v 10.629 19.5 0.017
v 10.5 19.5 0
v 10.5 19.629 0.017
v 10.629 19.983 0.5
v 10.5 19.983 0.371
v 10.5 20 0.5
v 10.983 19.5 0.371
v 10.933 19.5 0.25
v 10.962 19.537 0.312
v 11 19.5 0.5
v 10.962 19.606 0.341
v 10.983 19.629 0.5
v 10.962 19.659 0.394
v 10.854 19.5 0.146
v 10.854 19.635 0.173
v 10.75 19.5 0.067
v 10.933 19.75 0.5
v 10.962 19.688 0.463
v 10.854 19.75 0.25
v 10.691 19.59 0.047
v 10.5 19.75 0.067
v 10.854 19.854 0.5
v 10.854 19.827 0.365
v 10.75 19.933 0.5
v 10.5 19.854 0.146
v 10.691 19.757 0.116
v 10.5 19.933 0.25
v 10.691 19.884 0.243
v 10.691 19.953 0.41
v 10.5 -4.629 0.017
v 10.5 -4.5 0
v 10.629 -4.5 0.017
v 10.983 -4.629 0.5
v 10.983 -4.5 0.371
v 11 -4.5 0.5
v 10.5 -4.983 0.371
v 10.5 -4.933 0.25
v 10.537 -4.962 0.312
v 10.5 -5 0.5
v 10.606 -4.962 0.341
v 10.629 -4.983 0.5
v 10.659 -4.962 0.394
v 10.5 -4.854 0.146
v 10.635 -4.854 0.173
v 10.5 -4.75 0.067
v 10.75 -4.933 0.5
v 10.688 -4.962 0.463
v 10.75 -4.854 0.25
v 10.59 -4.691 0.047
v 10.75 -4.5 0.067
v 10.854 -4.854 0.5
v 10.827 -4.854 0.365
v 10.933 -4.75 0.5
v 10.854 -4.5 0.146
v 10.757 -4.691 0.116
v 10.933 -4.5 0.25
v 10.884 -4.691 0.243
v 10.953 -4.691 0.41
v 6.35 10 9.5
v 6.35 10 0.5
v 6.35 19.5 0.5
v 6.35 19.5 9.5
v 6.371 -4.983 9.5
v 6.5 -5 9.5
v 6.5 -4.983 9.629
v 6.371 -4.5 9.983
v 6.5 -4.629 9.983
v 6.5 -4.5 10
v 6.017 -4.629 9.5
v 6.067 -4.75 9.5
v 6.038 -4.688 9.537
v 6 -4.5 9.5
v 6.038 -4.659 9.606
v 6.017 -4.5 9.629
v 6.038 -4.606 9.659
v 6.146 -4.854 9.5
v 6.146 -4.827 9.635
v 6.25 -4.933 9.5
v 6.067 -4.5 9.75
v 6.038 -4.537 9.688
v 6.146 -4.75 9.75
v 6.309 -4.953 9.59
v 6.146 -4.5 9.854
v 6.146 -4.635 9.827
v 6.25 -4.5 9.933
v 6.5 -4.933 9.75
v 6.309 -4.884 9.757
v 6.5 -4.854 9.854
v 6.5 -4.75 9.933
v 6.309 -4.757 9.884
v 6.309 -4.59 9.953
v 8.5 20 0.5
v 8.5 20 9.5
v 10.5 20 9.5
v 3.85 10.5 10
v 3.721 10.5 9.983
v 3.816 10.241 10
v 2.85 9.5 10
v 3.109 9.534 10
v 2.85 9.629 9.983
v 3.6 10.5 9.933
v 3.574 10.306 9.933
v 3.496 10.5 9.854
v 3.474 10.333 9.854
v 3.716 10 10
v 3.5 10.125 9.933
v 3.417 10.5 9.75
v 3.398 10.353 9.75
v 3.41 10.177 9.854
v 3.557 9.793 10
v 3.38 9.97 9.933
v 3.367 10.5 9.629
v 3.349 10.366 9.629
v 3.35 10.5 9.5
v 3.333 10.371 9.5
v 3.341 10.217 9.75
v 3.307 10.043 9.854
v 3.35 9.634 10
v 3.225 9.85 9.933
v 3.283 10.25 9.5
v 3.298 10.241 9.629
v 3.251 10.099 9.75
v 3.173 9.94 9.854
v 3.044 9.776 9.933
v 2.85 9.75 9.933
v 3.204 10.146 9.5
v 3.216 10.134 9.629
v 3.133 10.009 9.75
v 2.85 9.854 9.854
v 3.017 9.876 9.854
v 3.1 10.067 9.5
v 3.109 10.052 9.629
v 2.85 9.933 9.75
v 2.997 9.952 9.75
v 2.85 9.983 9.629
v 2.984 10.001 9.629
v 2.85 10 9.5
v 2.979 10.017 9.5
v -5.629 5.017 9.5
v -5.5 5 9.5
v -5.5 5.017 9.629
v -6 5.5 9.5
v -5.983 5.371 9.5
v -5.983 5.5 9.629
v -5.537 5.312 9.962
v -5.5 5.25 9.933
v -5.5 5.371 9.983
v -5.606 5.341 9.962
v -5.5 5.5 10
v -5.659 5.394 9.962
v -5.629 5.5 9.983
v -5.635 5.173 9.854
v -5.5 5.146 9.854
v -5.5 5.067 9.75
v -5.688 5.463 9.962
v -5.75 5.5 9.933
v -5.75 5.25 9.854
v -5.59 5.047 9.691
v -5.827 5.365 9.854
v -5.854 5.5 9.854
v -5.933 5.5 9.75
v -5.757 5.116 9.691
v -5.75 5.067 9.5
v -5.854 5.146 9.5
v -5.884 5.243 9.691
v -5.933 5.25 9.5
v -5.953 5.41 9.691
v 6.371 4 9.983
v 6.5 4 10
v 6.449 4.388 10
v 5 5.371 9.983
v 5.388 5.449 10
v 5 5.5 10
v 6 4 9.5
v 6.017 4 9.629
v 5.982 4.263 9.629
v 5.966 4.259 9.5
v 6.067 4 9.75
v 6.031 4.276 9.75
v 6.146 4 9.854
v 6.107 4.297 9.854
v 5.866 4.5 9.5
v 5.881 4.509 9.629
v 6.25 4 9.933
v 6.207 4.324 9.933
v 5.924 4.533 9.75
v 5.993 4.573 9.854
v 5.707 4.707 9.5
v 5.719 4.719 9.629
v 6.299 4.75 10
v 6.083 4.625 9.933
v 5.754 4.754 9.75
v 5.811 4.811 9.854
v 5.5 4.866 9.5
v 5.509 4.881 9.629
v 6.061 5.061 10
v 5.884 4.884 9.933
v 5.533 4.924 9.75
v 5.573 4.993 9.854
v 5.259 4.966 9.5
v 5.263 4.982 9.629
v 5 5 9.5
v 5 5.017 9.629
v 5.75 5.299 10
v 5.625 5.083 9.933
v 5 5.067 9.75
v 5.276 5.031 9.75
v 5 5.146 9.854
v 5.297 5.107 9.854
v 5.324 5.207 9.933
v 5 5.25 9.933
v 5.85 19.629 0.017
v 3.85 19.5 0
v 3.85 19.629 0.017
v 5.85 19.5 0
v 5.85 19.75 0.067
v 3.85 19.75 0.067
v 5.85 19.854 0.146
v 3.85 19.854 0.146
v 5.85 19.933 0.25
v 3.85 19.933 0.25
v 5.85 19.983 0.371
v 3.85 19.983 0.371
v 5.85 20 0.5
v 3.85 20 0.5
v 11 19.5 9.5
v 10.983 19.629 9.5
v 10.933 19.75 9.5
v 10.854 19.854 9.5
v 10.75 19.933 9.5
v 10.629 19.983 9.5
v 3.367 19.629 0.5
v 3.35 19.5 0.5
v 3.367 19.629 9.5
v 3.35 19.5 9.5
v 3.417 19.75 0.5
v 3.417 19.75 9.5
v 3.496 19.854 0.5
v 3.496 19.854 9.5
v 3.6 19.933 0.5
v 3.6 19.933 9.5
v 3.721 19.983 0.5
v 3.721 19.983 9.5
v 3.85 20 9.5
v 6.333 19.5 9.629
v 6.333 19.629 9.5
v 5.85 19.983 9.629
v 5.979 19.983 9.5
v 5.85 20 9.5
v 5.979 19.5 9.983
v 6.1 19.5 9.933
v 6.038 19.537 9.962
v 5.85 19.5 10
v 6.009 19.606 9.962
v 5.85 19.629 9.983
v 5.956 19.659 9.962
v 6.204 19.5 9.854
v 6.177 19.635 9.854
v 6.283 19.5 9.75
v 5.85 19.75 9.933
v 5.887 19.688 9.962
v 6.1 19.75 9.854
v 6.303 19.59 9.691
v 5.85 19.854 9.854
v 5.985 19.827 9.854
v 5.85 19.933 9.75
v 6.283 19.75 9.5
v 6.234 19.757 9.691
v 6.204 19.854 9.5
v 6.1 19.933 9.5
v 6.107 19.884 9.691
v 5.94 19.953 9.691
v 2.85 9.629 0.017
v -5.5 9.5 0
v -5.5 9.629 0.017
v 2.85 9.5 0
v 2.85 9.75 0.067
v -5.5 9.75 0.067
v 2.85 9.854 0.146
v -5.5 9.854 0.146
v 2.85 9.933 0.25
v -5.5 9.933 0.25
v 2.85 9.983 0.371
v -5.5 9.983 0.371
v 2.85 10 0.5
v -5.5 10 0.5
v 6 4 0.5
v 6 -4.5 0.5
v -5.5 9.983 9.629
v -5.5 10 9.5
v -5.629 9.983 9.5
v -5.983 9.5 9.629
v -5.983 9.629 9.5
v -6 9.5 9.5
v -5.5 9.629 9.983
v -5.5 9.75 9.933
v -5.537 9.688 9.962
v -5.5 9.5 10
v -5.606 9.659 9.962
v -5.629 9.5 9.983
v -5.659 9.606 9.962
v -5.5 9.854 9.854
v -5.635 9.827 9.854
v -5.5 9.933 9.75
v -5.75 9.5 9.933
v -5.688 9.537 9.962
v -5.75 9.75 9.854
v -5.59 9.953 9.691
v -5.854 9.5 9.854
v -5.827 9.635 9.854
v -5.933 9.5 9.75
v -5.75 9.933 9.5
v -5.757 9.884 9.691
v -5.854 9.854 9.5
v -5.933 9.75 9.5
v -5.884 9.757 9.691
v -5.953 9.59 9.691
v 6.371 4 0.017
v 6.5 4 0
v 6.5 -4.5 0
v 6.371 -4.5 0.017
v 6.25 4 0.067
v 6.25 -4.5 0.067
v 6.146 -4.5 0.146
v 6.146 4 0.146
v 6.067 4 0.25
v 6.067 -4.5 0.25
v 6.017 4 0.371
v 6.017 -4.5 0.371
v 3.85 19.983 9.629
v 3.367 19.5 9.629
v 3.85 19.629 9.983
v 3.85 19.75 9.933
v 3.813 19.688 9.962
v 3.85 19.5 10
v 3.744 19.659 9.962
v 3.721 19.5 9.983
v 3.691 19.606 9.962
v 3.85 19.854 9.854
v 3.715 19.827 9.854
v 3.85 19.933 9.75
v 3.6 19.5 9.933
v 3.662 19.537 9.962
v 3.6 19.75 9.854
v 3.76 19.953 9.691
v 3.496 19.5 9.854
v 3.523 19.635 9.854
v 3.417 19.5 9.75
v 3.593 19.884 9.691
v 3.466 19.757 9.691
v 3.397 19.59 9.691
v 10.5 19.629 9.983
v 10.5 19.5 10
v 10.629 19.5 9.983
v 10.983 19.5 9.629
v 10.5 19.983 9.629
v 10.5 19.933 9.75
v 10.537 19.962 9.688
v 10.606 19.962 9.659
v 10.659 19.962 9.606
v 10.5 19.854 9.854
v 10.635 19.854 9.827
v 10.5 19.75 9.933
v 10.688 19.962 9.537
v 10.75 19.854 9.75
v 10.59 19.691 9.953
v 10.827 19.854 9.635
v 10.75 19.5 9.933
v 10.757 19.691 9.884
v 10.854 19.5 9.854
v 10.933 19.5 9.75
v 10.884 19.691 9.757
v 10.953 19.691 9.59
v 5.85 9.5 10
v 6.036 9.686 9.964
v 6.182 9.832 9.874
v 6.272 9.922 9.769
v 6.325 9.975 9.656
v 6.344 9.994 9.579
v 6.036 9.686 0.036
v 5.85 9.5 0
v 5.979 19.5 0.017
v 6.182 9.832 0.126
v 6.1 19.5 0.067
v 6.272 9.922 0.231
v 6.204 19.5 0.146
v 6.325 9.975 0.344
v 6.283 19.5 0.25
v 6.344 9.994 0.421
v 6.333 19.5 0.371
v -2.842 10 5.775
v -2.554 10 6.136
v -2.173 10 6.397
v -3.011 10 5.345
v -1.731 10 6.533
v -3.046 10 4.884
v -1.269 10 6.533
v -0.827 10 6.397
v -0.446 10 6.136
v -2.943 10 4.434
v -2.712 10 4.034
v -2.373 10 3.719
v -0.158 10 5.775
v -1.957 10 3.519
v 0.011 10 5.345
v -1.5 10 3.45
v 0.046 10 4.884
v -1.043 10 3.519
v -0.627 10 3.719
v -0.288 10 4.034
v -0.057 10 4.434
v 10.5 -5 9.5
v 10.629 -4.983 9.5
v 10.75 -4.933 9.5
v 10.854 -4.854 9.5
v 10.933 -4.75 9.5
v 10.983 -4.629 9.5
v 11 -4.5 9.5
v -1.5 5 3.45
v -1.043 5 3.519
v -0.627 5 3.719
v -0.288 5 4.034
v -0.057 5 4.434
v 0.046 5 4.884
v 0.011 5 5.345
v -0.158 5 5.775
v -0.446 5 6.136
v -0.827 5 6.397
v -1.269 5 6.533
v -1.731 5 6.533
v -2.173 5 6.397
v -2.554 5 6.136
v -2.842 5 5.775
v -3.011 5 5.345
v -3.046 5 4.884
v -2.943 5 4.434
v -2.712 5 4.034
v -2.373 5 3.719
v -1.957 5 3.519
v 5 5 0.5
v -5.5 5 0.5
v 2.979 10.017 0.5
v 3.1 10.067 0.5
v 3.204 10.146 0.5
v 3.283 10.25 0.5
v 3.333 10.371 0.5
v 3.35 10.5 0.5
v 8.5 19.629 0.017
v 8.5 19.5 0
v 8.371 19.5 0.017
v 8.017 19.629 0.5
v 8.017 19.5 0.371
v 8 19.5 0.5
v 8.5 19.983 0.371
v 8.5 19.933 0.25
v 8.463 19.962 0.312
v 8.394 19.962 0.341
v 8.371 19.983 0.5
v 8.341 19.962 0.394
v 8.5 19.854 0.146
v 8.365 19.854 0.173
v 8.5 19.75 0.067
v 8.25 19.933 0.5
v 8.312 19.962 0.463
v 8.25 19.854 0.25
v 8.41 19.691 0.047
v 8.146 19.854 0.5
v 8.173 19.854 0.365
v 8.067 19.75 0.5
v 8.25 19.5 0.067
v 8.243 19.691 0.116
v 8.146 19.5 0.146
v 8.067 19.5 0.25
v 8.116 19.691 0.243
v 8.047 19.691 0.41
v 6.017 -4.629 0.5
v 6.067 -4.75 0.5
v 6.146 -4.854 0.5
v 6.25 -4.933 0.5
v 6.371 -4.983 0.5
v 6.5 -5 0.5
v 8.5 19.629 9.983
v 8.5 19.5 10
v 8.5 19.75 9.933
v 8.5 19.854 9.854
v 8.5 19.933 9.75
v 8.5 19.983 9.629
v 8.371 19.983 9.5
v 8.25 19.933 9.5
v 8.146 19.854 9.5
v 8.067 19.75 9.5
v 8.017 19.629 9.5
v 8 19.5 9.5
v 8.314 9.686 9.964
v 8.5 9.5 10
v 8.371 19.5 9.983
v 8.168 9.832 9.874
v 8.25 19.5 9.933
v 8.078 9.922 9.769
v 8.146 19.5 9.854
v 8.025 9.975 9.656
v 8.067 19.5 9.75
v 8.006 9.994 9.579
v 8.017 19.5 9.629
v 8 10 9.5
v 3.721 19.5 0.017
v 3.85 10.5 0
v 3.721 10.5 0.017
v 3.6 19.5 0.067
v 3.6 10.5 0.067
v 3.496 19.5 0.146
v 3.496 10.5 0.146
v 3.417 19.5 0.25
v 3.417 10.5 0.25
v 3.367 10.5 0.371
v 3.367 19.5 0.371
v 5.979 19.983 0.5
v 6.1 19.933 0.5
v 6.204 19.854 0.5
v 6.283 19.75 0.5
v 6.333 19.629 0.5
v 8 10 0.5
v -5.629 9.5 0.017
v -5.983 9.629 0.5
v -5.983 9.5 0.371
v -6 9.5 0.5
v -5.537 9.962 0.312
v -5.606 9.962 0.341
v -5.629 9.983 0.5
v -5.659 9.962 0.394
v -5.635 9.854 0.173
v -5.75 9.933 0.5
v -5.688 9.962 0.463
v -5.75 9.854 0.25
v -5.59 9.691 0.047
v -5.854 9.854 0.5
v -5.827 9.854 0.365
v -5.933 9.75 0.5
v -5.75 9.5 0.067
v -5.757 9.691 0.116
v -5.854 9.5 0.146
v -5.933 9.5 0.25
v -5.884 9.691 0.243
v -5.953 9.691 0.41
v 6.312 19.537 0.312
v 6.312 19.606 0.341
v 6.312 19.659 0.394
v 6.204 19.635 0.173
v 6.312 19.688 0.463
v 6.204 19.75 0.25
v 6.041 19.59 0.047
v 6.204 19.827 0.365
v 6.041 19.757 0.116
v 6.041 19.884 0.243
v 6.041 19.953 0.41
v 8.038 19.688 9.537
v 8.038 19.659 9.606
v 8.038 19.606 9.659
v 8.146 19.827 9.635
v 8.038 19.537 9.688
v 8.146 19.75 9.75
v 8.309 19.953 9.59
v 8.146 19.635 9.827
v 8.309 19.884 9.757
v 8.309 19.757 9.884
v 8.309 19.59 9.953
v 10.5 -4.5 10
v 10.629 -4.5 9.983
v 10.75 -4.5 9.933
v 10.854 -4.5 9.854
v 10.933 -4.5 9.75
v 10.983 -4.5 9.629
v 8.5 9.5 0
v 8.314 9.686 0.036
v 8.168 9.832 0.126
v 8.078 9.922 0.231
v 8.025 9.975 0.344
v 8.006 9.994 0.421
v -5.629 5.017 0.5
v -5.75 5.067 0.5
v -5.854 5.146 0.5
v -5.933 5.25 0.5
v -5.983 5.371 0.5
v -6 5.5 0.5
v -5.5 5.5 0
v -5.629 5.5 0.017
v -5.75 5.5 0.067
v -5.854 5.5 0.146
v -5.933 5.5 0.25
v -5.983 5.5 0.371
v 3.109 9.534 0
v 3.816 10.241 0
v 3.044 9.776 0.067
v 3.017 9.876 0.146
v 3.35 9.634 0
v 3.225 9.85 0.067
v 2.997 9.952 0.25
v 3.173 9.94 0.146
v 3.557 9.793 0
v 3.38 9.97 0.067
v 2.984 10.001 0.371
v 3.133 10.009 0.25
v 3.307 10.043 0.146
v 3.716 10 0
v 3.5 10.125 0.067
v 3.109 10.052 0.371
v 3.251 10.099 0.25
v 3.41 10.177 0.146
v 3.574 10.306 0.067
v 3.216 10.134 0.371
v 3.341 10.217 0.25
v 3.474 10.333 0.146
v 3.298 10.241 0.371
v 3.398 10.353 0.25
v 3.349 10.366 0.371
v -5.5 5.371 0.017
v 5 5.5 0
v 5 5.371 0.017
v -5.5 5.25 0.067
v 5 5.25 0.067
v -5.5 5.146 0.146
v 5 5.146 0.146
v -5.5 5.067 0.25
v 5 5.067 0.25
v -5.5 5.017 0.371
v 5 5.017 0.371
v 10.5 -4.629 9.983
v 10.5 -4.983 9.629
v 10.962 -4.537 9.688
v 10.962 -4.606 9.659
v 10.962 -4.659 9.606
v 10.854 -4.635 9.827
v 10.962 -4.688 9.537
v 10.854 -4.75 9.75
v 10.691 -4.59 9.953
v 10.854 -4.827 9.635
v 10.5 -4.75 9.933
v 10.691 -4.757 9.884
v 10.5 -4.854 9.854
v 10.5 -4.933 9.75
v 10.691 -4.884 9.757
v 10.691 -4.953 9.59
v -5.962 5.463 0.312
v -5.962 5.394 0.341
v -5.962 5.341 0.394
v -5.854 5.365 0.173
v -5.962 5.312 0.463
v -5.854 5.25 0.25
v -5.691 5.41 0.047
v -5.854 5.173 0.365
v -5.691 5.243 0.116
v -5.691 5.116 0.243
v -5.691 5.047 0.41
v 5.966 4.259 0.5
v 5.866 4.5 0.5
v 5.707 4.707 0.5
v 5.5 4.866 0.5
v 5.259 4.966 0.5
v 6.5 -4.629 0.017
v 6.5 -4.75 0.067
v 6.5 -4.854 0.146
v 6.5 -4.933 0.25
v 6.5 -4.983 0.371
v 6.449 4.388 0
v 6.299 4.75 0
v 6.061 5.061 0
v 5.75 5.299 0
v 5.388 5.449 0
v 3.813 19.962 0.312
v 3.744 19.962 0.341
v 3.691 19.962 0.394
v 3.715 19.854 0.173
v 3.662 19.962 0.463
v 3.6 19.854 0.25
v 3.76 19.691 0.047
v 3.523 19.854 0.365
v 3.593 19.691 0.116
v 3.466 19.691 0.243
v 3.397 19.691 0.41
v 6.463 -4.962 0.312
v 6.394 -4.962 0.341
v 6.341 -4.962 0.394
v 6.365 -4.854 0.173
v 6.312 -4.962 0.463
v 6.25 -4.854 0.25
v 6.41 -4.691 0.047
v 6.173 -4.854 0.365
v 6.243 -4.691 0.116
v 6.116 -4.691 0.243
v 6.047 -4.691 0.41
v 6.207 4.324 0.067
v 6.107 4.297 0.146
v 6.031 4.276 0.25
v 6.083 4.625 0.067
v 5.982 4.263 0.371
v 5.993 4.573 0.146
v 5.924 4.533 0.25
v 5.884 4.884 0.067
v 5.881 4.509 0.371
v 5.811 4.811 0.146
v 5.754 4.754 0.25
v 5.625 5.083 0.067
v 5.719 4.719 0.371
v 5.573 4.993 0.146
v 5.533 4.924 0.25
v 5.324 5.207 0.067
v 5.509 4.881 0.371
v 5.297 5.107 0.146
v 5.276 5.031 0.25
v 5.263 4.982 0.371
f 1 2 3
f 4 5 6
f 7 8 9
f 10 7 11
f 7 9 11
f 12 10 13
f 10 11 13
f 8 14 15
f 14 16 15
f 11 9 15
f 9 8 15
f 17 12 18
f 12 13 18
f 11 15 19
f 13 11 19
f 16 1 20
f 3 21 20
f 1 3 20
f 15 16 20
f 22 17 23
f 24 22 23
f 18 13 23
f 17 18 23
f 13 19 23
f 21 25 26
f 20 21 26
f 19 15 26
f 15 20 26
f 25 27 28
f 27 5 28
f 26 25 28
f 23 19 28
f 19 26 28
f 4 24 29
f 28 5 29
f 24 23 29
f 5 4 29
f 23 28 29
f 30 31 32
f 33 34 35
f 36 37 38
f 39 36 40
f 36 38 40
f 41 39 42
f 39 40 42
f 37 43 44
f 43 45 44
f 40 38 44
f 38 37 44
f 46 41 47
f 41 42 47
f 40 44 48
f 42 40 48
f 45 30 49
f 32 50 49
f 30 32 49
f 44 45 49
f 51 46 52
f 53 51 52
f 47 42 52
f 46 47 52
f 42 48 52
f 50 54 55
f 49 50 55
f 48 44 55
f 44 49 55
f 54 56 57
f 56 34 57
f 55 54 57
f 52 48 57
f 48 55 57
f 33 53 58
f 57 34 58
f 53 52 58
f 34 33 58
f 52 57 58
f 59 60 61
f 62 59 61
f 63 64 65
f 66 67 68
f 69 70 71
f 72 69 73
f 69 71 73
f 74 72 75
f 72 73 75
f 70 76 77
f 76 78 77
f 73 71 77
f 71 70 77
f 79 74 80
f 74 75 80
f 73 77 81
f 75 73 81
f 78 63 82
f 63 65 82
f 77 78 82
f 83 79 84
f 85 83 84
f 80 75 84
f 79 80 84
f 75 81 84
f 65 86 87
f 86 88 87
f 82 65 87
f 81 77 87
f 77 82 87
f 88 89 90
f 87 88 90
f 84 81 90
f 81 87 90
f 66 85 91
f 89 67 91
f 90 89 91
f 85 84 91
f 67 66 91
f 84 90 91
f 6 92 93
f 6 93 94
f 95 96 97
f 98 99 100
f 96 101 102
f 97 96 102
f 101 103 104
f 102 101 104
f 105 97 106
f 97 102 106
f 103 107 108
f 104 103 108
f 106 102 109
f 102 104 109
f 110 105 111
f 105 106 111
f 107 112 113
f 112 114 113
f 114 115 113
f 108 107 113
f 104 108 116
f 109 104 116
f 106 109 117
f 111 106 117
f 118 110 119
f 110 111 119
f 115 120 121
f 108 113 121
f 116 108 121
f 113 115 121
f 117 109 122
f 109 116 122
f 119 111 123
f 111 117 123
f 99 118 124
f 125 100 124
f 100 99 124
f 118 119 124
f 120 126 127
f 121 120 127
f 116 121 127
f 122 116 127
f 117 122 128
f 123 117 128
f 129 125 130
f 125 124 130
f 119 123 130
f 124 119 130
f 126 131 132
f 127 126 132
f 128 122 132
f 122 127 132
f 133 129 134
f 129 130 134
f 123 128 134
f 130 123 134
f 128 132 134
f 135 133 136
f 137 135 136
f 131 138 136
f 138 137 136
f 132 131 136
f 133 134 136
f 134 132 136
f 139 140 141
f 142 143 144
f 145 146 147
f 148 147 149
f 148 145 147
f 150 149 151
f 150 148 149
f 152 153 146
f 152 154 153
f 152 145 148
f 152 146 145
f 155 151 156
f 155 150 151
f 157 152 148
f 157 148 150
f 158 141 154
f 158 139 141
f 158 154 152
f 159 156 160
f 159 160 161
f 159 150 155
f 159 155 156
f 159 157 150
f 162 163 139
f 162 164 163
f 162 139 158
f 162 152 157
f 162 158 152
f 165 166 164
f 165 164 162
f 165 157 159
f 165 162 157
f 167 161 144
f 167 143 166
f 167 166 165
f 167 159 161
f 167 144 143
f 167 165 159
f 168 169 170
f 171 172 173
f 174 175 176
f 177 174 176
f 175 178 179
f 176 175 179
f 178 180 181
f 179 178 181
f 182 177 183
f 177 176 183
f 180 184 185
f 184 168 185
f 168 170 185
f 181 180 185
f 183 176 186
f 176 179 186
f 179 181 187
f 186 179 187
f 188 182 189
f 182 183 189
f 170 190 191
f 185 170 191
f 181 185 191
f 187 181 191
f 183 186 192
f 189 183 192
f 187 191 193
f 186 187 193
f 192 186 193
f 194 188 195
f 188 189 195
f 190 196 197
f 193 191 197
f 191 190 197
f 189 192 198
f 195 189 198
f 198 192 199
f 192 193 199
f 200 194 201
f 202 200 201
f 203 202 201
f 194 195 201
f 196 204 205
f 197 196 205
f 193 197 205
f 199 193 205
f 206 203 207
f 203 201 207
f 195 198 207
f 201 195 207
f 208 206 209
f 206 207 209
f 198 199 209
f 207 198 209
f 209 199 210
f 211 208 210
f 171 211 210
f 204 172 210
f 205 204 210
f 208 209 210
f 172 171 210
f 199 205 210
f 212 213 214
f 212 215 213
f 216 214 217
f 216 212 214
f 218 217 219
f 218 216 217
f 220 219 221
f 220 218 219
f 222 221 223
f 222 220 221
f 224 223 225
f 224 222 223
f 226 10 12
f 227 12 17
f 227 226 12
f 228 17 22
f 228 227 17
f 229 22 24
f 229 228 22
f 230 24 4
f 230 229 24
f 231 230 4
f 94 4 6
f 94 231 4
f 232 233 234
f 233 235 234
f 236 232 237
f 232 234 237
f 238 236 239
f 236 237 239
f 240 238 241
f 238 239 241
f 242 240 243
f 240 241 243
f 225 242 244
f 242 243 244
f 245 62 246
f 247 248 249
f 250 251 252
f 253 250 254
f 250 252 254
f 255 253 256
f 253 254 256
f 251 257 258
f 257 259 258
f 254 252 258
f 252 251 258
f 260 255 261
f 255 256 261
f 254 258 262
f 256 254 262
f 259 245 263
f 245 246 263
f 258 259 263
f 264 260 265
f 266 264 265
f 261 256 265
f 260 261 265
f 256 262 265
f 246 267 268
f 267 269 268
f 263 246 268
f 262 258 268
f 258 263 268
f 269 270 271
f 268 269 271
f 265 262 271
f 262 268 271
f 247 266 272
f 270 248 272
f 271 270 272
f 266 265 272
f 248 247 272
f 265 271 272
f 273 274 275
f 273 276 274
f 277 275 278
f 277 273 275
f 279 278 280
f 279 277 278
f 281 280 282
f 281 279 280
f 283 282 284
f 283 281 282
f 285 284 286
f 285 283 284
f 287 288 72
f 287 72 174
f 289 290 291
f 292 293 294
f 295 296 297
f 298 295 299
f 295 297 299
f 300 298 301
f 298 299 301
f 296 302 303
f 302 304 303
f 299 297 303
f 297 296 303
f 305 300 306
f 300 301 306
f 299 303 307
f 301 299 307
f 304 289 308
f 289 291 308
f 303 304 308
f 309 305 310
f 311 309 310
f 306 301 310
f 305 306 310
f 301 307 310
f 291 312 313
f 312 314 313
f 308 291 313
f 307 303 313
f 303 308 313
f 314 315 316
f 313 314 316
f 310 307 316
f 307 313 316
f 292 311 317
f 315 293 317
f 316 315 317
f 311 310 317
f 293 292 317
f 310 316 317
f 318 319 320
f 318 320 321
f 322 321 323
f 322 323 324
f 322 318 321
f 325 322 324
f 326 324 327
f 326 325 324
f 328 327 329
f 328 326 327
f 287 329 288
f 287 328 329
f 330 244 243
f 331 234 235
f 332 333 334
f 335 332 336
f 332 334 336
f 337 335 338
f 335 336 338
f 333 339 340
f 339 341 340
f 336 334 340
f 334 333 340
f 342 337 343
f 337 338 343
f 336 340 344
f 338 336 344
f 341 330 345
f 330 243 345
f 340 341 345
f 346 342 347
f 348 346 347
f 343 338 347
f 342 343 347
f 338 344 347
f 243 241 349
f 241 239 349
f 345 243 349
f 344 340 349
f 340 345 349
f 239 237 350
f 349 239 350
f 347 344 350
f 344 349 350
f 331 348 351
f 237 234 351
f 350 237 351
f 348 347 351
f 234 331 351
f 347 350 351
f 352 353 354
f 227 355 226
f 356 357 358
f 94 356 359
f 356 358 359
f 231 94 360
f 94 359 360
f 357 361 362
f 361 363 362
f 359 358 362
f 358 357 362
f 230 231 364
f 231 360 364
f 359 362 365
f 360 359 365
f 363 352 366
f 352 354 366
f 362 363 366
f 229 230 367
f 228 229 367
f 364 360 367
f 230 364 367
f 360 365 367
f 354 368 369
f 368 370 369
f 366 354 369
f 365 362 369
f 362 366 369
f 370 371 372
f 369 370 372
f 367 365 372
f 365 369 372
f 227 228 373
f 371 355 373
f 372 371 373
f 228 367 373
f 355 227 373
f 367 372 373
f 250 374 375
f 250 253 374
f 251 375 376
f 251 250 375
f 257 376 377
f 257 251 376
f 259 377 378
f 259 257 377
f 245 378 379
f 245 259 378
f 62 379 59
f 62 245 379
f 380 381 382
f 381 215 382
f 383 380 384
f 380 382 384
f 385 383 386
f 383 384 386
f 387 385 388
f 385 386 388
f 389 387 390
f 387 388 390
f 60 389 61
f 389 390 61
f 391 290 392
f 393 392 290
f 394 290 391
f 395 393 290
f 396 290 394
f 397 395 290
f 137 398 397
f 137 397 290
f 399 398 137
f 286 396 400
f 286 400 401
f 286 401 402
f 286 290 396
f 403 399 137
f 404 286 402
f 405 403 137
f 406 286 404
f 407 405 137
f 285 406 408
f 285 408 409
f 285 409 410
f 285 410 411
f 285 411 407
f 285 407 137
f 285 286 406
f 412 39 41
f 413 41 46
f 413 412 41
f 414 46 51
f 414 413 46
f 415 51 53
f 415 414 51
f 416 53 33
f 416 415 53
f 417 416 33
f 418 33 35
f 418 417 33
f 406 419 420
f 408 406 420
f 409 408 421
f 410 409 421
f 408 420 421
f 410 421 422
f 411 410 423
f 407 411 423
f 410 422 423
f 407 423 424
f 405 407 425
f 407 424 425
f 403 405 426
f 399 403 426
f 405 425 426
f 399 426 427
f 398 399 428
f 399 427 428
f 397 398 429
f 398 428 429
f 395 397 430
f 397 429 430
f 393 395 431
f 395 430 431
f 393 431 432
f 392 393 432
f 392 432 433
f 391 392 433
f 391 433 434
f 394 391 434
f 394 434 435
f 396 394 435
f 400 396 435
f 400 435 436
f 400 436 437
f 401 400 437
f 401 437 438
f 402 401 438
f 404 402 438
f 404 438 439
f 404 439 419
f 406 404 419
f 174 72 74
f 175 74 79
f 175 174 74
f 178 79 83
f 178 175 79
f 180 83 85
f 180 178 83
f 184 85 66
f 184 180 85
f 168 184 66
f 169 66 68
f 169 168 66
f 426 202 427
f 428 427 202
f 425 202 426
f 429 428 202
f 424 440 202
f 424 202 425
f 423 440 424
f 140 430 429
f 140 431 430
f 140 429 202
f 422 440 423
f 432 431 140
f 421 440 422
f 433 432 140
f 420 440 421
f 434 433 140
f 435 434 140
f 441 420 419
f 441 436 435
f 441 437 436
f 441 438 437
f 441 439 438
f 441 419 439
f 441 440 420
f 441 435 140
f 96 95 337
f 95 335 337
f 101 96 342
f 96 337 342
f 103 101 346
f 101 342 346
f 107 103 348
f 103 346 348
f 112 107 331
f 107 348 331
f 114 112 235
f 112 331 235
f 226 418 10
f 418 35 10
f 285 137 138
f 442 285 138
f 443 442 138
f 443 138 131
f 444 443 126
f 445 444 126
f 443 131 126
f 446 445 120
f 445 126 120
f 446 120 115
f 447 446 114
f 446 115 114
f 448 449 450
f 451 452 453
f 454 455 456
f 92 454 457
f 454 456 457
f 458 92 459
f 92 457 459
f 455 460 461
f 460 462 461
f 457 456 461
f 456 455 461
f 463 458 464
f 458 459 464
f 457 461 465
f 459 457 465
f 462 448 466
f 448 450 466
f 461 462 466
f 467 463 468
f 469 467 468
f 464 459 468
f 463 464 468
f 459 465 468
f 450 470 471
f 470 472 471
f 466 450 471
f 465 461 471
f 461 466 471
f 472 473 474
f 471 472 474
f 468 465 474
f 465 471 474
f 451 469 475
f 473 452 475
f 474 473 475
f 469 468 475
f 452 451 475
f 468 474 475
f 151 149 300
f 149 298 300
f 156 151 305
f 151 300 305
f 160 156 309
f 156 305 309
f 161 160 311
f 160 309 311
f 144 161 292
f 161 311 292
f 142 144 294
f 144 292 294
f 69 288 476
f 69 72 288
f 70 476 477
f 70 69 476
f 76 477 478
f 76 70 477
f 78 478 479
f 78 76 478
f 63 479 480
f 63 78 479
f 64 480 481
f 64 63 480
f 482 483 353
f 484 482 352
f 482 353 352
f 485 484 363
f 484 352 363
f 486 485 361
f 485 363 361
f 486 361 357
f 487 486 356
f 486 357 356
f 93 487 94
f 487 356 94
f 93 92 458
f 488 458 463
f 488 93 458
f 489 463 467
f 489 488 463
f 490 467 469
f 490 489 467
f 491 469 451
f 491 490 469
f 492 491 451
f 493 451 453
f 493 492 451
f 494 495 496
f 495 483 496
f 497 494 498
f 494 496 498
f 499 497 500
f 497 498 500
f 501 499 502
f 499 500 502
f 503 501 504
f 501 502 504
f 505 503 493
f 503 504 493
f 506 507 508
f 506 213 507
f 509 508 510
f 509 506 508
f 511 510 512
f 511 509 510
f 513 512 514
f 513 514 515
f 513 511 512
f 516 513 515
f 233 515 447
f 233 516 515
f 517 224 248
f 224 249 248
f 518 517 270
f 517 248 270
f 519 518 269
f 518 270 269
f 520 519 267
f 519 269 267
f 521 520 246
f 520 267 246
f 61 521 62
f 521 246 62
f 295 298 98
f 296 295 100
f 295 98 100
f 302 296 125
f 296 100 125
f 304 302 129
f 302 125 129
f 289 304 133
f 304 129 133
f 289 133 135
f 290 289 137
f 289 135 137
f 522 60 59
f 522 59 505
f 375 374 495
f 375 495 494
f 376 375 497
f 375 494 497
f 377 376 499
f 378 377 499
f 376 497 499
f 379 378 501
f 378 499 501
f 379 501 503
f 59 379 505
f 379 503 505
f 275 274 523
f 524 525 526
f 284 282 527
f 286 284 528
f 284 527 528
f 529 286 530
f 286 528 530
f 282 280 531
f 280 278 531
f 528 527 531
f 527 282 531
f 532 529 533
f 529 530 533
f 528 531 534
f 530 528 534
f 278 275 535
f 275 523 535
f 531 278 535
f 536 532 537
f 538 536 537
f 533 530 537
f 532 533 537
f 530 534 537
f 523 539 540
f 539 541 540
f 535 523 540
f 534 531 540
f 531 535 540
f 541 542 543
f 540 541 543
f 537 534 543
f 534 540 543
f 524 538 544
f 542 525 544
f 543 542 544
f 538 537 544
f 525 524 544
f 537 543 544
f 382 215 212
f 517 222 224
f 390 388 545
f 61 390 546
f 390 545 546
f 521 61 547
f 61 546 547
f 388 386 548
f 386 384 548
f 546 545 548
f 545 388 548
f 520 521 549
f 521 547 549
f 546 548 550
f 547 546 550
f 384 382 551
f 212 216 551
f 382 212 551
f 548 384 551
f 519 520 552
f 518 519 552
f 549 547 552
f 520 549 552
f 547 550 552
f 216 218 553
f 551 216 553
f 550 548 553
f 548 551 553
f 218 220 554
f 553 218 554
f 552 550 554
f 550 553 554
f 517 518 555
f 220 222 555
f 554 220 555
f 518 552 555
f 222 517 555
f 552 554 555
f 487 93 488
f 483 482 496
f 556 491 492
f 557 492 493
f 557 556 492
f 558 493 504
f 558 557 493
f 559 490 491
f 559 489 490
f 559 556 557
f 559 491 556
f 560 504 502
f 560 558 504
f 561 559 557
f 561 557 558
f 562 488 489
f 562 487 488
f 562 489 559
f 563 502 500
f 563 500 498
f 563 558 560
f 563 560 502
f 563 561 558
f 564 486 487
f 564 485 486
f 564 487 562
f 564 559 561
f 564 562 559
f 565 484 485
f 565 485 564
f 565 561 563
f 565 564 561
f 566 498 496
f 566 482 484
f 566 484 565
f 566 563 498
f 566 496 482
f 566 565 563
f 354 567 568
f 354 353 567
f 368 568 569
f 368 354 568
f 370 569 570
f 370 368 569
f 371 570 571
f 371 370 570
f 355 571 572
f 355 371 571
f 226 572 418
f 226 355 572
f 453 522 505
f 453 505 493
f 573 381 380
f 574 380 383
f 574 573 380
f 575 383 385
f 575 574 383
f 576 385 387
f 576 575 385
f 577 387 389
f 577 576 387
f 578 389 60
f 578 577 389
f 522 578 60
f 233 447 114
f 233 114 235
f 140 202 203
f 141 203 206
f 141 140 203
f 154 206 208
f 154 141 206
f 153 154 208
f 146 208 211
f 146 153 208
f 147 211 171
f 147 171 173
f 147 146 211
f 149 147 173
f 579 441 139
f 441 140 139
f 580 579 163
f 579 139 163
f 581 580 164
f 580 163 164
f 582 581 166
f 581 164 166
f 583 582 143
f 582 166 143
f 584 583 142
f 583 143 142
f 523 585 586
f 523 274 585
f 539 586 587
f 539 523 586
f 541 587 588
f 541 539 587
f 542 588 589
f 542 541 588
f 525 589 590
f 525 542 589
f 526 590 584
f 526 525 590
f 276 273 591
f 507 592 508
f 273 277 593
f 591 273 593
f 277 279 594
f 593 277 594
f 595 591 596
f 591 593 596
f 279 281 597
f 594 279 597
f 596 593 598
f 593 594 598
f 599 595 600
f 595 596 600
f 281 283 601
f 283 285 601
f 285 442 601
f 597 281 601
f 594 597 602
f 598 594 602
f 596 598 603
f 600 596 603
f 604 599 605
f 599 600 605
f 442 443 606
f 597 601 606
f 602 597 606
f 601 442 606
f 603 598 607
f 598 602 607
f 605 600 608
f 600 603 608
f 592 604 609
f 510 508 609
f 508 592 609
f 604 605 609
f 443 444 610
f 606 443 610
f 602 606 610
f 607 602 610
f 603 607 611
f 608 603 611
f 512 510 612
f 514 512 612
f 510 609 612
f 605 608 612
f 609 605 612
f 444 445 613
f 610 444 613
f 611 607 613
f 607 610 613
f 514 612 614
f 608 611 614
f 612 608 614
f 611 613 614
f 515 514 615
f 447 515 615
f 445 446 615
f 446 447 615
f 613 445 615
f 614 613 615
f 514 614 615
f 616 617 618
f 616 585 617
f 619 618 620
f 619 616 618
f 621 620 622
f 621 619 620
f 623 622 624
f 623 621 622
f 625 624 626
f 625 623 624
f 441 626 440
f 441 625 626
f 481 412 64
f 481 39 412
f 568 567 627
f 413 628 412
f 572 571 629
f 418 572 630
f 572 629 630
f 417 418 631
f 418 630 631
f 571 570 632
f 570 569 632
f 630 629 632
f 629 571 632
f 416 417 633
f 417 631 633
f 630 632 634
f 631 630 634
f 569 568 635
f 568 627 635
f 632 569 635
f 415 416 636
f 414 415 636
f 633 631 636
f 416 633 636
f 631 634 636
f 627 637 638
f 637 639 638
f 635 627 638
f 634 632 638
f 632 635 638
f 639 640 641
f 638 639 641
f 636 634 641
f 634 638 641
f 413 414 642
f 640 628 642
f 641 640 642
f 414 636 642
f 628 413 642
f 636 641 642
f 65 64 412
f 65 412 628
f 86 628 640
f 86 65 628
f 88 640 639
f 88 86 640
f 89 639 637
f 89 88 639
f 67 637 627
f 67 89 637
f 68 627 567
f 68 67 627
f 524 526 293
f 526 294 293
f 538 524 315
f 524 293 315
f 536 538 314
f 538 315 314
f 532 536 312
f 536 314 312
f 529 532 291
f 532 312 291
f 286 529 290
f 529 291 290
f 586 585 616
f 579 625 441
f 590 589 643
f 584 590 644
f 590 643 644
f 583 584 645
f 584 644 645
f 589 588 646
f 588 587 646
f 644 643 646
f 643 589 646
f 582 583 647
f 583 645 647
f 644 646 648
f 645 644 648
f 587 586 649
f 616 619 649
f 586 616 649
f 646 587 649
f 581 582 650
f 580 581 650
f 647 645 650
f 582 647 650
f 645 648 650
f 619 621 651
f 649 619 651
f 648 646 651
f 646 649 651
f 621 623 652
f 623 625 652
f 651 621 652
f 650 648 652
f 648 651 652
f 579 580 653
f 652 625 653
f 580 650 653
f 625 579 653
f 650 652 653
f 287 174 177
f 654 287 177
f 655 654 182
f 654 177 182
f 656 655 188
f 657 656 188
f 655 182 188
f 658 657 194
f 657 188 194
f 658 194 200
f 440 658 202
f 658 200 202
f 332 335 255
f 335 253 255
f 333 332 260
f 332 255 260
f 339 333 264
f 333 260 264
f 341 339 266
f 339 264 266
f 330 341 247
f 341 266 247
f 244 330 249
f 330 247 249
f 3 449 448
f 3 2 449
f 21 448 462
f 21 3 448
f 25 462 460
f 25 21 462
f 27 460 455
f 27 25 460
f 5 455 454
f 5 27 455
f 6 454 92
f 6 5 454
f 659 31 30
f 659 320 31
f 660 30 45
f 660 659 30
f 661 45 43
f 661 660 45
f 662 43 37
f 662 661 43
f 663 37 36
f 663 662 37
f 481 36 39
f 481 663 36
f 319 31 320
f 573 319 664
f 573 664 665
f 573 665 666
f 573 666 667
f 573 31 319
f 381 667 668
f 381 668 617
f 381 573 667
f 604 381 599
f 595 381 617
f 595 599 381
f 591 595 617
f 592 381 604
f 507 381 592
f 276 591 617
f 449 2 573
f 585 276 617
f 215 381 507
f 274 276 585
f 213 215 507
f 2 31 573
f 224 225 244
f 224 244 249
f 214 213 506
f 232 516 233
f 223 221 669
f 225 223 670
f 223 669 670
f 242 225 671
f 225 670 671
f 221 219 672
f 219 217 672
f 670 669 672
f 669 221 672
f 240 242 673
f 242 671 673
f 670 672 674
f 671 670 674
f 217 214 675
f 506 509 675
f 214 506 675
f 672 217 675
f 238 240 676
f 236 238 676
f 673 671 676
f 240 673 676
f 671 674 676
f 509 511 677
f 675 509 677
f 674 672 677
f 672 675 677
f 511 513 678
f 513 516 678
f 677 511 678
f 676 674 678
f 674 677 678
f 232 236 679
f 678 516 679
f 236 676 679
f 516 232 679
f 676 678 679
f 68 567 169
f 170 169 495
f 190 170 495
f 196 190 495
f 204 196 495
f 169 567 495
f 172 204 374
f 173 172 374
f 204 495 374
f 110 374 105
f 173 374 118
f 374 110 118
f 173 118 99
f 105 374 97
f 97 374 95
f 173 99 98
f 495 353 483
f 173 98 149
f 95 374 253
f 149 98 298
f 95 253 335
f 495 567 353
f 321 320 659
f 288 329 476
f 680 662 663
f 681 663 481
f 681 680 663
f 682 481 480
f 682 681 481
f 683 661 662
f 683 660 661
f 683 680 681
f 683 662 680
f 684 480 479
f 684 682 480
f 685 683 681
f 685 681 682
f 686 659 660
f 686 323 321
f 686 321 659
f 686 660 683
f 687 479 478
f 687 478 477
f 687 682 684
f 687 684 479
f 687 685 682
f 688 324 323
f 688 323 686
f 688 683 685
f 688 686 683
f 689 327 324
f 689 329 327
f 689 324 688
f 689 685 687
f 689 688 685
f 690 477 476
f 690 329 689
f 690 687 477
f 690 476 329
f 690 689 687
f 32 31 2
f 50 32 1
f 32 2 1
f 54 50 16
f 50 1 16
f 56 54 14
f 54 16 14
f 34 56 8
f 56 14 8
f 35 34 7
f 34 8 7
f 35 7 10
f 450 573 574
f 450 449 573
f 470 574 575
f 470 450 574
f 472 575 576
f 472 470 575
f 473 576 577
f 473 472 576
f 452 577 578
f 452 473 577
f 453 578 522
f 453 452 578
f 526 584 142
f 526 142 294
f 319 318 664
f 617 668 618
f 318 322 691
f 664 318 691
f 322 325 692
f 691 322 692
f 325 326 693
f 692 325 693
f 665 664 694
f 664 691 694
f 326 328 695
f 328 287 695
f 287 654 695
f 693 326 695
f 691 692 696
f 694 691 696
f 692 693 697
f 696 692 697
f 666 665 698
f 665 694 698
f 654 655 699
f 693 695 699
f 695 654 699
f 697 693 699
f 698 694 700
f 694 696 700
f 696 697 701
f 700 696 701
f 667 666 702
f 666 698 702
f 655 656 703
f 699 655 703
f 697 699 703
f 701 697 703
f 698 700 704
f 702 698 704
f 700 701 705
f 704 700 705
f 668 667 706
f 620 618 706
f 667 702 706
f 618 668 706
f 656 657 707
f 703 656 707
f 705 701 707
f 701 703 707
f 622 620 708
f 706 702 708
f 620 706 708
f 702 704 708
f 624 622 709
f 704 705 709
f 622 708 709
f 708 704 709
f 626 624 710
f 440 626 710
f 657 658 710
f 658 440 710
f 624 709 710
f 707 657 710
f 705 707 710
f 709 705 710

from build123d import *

# Parameters (mm, degrees)
SKETCH1_W           = 3
SKETCH1_H           = 10
BOSS_EXTRUDE1_DEPTH = 10
SKETCH3_R           = 1.55
CUT_EXTRUDE1_DEPTH  = 10
FILLET1_R           = 1
FILLET2_R           = 0.5


with BuildPart() as part:
    # Sketch1 → Boss-Extrude1 (new body)
    with BuildSketch(Plane.XY):
        Polygon((6, -5), (6, 5), (-6, 5), (-6, 10), (11, 10), (11, -5), align=None)
        with Locations((4.85, 15)):
            Rectangle(SKETCH1_W, SKETCH1_H)
        with Locations((9.5, 15)):
            Rectangle(SKETCH1_W, SKETCH1_H)
    extrude(amount=BOSS_EXTRUDE1_DEPTH)

    # Sketch3 → Cut-Extrude1 (cut)
    with BuildSketch(Plane.XZ.offset(-5)):
        with Locations(Location((-1.5, 5, 0), (0, 0, 270))):
            Circle(SKETCH3_R)
    extrude(amount=-CUT_EXTRUDE1_DEPTH, mode=Mode.SUBTRACT)

    # Fillet1
    fillet1_edges = [part.edges().sort_by_distance(p)[0] for p in [
        (6, 5, 5),
    ]]
    fillet(fillet1_edges, radius=FILLET1_R)

    # Fillet2
    fillet2_edges = [part.edges().sort_by_distance(p)[0] for p in [
        (8.5, -5, 10),
        (-0.5, 5, 0),
        (-6, 7.5, 0),
        (11, 7.5, 10),
        (-1.325, 10, 0),
        (3.35, 15, 0),
        (4.85, 20, 0),
        (6.35, 15, 0),
        (7.175, 10, 0),
        (8, 15, 0),
        (9.5, 20, 0),
        (11, 7.5, 0),
        (8.5, -5, 0),
        (6, -0.5, 0),
        (9.5, 20, 10),
        (-6, 5, 5),
        (-6, 10, 5),
        (3.35, 10, 5),
        (3.35, 20, 5),
        (6.35, 20, 5),
        (8, 20, 5),
        (11, 20, 5),
        (11, -5, 5),
        (6, -5, 5),
        (8, 15, 10),
        (7.175, 10, 10),
        (6.35, 15, 10),
        (4.85, 20, 10),
        (5.707106781, 4.707106781, 0),
        (5.707106781, 4.707106781, 10),
        (3.35, 15, 10),
        (6, -0.5, 10),
        (-1.325, 10, 10),
        (-6, 7.5, 10),
        (-0.5, 5, 10),
    ]]
    fillet(fillet2_edges, radius=FILLET2_R)


solid = part.part
